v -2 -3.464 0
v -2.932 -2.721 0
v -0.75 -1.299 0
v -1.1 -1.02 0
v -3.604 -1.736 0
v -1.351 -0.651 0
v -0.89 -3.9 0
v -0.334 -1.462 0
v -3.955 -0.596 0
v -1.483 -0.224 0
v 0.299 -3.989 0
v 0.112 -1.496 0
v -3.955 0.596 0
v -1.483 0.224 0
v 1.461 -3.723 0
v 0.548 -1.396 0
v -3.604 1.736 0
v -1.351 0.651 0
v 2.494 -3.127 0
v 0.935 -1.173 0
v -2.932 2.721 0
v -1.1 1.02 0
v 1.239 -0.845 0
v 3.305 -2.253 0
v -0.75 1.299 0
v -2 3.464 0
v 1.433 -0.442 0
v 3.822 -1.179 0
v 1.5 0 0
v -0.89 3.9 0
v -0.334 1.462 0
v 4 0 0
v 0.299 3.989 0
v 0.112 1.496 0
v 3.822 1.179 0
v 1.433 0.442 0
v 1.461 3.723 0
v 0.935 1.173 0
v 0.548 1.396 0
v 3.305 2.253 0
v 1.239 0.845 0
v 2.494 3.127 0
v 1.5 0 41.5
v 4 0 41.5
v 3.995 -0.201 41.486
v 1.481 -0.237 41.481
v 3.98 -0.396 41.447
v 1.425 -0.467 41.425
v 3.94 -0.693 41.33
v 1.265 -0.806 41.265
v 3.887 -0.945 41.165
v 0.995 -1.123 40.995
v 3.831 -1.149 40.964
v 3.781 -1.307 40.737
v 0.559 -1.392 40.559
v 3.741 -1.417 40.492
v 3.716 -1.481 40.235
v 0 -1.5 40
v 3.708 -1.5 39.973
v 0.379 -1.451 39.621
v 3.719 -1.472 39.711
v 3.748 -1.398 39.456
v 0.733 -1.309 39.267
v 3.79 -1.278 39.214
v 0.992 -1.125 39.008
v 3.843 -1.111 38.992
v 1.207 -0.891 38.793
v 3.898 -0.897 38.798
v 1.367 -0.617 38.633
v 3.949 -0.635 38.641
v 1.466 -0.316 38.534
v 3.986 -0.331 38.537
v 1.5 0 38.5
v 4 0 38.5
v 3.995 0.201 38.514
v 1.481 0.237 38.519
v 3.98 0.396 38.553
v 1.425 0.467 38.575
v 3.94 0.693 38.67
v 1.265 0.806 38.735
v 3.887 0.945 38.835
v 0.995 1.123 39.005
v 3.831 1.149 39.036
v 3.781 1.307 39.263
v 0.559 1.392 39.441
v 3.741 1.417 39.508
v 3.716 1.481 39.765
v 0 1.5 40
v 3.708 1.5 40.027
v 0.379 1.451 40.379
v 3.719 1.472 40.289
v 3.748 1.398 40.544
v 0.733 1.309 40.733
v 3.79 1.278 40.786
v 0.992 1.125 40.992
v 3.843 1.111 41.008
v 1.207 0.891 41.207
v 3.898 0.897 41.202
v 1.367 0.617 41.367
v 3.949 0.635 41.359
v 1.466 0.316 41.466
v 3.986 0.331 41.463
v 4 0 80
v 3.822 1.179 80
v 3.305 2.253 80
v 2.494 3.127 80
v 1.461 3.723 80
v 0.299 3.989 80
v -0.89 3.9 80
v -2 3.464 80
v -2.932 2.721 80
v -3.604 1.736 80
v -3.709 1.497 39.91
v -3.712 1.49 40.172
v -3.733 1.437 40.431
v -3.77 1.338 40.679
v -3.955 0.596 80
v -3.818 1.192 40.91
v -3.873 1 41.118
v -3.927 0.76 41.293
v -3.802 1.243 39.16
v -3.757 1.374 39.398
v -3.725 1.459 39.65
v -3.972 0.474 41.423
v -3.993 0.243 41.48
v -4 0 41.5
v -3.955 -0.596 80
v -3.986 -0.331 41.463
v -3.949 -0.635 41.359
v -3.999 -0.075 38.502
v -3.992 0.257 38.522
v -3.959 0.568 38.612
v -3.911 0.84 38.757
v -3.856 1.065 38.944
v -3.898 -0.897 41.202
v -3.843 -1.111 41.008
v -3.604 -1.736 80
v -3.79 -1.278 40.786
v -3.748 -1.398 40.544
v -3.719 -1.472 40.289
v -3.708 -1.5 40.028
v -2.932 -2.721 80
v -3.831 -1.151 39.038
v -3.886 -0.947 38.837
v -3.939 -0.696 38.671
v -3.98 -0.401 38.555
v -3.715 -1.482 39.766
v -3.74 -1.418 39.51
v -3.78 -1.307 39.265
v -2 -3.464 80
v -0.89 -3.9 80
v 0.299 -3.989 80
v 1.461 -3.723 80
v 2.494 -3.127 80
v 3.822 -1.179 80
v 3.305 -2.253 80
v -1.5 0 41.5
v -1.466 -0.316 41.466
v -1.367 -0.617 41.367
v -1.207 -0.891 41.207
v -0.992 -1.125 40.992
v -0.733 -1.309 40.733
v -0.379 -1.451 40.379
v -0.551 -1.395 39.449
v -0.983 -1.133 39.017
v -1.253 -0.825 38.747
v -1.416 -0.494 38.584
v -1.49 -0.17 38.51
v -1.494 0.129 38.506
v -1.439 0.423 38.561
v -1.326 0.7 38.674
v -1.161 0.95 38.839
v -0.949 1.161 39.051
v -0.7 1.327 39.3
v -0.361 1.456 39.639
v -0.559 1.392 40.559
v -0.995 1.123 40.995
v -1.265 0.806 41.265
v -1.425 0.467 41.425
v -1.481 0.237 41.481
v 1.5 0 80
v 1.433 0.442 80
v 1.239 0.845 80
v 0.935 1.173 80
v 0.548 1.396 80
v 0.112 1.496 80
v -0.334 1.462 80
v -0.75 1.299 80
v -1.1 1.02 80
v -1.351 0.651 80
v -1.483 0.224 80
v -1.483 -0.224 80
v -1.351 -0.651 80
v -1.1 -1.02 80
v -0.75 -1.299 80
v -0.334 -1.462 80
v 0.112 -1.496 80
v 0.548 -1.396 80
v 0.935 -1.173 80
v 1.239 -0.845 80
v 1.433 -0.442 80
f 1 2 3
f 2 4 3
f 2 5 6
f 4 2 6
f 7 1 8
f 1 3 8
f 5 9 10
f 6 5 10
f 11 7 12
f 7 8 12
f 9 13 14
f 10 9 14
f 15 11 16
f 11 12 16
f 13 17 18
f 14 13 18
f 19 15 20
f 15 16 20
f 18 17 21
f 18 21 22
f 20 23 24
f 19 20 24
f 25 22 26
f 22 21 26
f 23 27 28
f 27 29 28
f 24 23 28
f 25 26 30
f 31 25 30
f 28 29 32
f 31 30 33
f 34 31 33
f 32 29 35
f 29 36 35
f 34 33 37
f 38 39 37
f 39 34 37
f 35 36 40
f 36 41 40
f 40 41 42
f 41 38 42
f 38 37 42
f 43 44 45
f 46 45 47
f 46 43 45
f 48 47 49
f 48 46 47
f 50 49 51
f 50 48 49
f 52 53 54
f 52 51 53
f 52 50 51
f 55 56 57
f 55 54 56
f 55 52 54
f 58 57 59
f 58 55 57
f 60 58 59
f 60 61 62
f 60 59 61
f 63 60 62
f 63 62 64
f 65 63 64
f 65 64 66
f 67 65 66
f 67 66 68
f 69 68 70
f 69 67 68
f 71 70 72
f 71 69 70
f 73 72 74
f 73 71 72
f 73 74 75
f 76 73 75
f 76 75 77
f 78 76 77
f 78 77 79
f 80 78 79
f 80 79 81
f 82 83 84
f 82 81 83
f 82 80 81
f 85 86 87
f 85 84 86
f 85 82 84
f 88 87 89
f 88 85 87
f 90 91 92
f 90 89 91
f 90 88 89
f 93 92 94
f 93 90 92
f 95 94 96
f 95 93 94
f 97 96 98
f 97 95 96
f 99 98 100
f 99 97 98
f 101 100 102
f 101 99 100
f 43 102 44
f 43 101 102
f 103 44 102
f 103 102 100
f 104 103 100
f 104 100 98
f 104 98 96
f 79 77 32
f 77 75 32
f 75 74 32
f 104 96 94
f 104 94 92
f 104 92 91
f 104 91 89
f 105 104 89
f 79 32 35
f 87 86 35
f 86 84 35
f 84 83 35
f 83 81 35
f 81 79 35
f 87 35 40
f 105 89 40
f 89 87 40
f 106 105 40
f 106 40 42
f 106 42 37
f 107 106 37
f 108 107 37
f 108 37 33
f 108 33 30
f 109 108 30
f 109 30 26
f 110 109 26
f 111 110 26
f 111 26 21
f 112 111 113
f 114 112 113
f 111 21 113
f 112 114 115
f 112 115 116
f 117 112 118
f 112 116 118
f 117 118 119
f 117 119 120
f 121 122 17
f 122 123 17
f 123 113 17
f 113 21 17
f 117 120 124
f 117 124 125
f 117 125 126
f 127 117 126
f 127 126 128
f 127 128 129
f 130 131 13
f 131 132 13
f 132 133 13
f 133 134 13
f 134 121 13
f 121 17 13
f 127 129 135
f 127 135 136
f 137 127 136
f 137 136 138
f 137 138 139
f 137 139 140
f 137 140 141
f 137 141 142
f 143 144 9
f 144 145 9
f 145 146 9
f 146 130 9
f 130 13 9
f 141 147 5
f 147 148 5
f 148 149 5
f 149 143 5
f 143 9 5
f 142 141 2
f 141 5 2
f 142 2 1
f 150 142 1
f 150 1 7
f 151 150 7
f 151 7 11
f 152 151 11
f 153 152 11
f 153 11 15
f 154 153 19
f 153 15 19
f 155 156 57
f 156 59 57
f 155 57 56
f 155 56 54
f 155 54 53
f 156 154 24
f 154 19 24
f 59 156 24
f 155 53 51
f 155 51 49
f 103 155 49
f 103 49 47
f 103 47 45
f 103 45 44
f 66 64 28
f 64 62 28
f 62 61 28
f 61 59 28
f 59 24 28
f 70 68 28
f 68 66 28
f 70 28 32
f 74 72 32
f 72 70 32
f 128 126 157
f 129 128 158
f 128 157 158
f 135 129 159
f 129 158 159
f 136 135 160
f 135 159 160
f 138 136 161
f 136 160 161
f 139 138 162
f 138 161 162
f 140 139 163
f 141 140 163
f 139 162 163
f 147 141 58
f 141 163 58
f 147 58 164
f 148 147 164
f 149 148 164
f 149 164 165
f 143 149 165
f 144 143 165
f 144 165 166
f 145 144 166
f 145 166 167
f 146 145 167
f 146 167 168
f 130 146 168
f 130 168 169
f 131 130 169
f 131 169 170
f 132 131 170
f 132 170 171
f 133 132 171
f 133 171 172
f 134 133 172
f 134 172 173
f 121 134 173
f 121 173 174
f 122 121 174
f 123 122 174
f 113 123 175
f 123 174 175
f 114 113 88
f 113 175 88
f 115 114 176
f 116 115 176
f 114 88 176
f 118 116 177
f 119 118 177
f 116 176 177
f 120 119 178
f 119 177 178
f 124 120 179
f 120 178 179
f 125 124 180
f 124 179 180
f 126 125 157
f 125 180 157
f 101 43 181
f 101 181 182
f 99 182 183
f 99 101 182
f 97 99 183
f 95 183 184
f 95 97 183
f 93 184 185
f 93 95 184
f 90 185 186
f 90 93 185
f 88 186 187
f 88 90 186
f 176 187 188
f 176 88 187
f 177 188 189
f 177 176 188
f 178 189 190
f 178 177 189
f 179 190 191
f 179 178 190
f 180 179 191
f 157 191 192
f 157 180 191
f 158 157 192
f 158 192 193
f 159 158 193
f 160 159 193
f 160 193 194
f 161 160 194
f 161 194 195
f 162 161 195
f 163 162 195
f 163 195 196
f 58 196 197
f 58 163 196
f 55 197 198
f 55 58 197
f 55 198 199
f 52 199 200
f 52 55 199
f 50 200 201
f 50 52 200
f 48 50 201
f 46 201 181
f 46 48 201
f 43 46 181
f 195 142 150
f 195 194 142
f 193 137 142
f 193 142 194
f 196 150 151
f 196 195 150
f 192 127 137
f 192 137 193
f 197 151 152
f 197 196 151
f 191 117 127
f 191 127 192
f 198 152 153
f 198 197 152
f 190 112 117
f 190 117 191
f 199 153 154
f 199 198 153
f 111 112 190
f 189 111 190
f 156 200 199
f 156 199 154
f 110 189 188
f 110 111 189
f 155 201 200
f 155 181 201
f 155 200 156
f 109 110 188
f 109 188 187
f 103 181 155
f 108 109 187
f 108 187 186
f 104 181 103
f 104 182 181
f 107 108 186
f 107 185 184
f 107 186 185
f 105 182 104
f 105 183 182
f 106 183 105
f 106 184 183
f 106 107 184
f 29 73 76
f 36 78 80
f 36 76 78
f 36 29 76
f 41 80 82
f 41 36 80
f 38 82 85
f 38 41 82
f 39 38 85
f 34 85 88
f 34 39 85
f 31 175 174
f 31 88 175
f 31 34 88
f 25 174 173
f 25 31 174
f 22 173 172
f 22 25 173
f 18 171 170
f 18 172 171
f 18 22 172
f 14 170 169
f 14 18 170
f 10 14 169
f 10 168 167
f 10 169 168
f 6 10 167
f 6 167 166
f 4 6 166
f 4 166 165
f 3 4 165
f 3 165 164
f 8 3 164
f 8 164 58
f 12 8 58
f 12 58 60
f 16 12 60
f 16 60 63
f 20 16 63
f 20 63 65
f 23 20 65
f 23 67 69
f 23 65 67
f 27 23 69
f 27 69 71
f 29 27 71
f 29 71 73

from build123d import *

# Parameters (mm, degrees)
ESBO_O1_R                         = 4
ESBO_O1_R_2                       = 1.5
RESSALTO_EXTRUS_O2_DEPTH          = 80
CORTE_EXTRUS_O1_REACH             = 82.2
ESBO_O2_R                         = 1.5
CORTE_EXTRUS_O1_DIRECTION_2_REACH = 82.2


with BuildPart() as part:
    # Esboço1 → Ressalto-extrusão2 (new body)
    with BuildSketch(Plane.XY):
        Circle(ESBO_O1_R)
        Circle(ESBO_O1_R_2, mode=Mode.SUBTRACT)
    extrude(amount=RESSALTO_EXTRUS_O2_DEPTH)

    # Esboço2 → Corte-extrusão1 (cut, up to next)
    with BuildSketch(Plane(origin=(0, 0, 0), x_dir=(0, 0, -1), z_dir=(1, 0, 0)), mode=Mode.PRIVATE) as corte_extrus_o1_sk1:
        with Locations(Location((-40, 0, 0), (0, 0, 180))):
            Circle(ESBO_O2_R)
    corte_extrus_o1_tool1 = extrude(corte_extrus_o1_sk1.sketch, amount=-CORTE_EXTRUS_O1_REACH, mode=Mode.PRIVATE) & part.part
    add(corte_extrus_o1_tool1.solids().sort_by_distance((0, 0, 40))[0], mode=Mode.SUBTRACT)

    # Esboço2 → Corte-extrusão1 direction 2 (cut, up to next)
    with BuildSketch(Plane(origin=(0, 0, 0), x_dir=(0, 0, -1), z_dir=(1, 0, 0)), mode=Mode.PRIVATE) as corte_extrus_o1_direction_2_sk1:
        with Locations(Location((-40, 0, 0), (0, 0, 180))):
            Circle(ESBO_O2_R)
    corte_extrus_o1_direction_2_tool1 = extrude(corte_extrus_o1_direction_2_sk1.sketch, amount=CORTE_EXTRUS_O1_DIRECTION_2_REACH, mode=Mode.PRIVATE) & part.part
    add(corte_extrus_o1_direction_2_tool1.solids().sort_by_distance((0, 0, 40))[0], mode=Mode.SUBTRACT)


solid = part.part
